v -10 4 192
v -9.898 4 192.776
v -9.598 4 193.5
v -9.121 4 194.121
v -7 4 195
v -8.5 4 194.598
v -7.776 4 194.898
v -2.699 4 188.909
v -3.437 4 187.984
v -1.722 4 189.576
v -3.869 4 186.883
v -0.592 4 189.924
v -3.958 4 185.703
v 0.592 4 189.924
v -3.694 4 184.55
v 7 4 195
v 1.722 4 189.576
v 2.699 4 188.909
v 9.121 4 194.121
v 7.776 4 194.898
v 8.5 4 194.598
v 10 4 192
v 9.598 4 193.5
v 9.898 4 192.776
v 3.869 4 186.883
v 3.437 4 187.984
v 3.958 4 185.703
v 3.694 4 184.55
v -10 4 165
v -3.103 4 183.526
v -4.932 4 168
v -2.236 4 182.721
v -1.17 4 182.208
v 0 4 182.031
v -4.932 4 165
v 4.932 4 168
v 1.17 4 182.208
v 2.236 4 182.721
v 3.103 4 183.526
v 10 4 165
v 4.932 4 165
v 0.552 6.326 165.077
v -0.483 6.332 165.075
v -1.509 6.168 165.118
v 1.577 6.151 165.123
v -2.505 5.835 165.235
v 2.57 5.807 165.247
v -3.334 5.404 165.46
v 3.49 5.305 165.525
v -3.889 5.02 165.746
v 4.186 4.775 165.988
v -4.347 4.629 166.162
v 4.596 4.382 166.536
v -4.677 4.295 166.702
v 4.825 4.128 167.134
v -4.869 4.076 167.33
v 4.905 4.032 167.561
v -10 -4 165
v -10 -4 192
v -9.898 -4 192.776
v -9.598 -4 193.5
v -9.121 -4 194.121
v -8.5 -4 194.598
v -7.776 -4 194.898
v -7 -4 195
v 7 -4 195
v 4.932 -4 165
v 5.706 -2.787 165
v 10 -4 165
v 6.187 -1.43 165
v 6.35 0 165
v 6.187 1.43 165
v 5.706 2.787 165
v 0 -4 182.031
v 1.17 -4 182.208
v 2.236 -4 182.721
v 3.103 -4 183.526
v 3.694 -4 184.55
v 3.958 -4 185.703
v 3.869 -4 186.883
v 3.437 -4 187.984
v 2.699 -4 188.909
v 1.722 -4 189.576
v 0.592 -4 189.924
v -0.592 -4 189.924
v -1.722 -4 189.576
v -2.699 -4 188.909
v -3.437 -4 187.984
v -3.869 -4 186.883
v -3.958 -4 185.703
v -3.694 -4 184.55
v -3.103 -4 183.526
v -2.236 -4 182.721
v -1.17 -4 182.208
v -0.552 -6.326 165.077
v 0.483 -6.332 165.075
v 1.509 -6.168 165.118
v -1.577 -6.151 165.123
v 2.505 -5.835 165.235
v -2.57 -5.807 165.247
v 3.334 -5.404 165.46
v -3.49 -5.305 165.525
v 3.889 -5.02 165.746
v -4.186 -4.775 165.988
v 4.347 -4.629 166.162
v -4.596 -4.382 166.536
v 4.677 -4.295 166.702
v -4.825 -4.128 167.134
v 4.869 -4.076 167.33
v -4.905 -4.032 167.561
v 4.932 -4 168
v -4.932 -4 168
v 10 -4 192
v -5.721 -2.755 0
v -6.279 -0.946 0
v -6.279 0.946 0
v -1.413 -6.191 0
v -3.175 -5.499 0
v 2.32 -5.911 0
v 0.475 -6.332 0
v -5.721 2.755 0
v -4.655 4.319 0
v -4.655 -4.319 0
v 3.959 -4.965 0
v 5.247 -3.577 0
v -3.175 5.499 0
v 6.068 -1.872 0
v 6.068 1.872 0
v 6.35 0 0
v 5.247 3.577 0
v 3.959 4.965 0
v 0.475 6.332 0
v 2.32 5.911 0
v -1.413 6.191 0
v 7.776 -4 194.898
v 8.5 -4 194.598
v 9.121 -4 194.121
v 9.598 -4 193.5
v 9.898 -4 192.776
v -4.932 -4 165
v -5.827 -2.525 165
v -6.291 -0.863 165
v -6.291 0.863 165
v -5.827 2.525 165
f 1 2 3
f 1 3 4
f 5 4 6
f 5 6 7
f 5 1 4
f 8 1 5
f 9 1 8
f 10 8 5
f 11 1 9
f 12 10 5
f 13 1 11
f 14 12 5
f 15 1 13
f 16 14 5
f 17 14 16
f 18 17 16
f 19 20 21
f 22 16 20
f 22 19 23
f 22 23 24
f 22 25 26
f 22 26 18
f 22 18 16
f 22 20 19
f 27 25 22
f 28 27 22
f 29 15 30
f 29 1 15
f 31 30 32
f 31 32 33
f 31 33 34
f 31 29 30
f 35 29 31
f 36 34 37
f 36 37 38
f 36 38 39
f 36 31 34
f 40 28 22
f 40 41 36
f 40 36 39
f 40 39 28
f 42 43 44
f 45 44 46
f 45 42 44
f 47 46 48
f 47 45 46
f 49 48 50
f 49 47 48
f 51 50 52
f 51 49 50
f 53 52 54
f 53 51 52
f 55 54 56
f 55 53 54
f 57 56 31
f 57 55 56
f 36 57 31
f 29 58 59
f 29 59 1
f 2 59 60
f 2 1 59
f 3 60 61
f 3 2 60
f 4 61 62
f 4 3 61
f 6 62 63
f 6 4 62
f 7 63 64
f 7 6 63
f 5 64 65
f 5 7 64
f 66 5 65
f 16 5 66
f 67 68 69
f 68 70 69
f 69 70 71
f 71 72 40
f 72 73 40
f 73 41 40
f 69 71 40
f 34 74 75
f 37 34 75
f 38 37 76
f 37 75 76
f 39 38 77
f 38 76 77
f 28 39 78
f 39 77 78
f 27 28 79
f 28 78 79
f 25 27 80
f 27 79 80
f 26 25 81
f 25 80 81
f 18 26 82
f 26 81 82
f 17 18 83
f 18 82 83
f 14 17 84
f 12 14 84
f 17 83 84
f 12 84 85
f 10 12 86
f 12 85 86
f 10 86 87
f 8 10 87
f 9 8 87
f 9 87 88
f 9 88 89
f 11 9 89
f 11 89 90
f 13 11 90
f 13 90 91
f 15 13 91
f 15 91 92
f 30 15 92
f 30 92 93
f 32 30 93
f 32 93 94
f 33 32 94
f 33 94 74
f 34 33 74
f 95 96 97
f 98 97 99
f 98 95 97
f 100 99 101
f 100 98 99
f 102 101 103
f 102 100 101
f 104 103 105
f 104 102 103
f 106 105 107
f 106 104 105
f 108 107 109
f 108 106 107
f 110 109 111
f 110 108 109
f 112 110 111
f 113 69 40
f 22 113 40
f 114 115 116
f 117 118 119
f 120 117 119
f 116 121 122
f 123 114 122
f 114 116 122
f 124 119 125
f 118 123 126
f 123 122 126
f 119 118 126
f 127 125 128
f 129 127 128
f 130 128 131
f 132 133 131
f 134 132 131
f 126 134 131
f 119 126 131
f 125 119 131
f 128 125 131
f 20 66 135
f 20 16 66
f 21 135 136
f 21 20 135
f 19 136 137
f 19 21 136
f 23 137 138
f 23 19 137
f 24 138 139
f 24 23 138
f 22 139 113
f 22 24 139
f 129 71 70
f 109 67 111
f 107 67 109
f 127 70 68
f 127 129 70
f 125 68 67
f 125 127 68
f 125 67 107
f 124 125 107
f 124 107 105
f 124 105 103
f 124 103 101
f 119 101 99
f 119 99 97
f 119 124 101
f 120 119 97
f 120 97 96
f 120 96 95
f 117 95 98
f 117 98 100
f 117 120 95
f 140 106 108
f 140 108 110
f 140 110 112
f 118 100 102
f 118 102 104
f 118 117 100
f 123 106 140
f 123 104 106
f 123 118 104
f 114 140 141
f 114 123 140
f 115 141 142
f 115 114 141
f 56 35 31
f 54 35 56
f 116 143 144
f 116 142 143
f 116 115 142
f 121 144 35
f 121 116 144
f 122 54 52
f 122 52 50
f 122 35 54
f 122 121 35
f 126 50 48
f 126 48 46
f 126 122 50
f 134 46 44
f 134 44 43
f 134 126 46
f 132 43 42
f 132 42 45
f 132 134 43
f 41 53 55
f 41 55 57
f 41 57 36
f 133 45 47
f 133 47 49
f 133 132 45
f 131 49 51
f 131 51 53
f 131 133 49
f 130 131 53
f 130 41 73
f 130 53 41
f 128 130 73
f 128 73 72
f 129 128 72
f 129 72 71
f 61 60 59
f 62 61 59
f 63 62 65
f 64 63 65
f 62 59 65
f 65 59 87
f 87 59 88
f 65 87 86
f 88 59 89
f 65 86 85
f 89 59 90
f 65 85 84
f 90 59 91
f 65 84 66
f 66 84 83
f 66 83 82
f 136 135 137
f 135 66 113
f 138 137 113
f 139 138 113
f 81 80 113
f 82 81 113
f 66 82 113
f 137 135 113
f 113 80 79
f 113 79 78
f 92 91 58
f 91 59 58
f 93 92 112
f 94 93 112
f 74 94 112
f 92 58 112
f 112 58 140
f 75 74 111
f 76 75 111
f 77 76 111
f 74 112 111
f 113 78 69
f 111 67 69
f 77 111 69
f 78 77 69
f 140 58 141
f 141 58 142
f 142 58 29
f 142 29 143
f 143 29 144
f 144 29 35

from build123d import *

# Parameters (mm, degrees)
CROQUIS1_R              = 6.35
SALIENTE_EXTRUIR1_DEPTH = 165
CROQUIS2_W              = 20
CROQUIS2_H              = 8
SALIENTE_EXTRUIR2_DEPTH = 30
REDONDEO1_R             = 3
REDONDEO2_R             = 3
CROQUIS3_R              = 3.96875
CORTAR_EXTRUIR1_DEPTH   = 30
REDONDEO3_R             = 3


with BuildPart() as part:
    # Croquis1 → Saliente-Extruir1 (new body)
    with BuildSketch(Plane.XY):
        Circle(CROQUIS1_R)
    extrude(amount=SALIENTE_EXTRUIR1_DEPTH)

    # Croquis2 → Saliente-Extruir2 (add)
    with BuildSketch(Plane.XY.offset(165)):
        Rectangle(CROQUIS2_W, CROQUIS2_H)
    extrude(amount=SALIENTE_EXTRUIR2_DEPTH)

    # Redondeo1
    # the kernel refuses this fillet: 3 mm, written as the material it adds along each edge
    with BuildSketch(Plane(origin=(12.431784667, 4, 165), x_dir=(0, 1, 0), z_dir=(-1, 0, 0))) as redondeo1_piece_1_section:
        with BuildLine():
            CenterArc((REDONDEO1_R, -REDONDEO1_R), REDONDEO1_R, 90, 90)
            Line((0, -REDONDEO1_R), (0, 0))
            Line((0, 0), (REDONDEO1_R, 0))
        make_face()
    redondeo1_piece_1 = extrude(amount=24.863569334, mode=Mode.PRIVATE)
    redondeo1_piece_1 = redondeo1_piece_1 & Plane(origin=(0, 0, 165.727834691), x_dir=(1, 0, 0), z_dir=(0, 0, -1)) * Cylinder(6.35, 62, mode=Mode.PRIVATE)
    add(redondeo1_piece_1)

    # Redondeo2
    # the kernel refuses this fillet: 3 mm, written as the material it adds along each edge
    with BuildSketch(Plane(origin=(-12.431784667, -4, 165), x_dir=(0, 0, 1), z_dir=(1, 0, 0))) as redondeo2_piece_1_section:
        with BuildLine():
            CenterArc((REDONDEO2_R, REDONDEO2_R), REDONDEO2_R, 180, 90)
            Line((0, REDONDEO2_R), (0, 0))
            Line((0, 0), (REDONDEO2_R, 0))
        make_face()
    redondeo2_piece_1 = extrude(amount=24.863569334, mode=Mode.PRIVATE)
    redondeo2_piece_1 = redondeo2_piece_1 & Plane(origin=(0, 0, 165.727832958), x_dir=(1, 0, 0), z_dir=(0, 0, -1)) * Cylinder(6.35, 62, mode=Mode.PRIVATE)
    add(redondeo2_piece_1)

    # Croquis3 → Cortar-Extruir1 (cut)
    with BuildSketch(Plane.XZ.offset(4)):
        with Locations(Location((0, 186, 0), (0, 0, 270))):
            Circle(CROQUIS3_R)
    extrude(amount=-CORTAR_EXTRUIR1_DEPTH, mode=Mode.SUBTRACT)

    # Redondeo3
    redondeo3_edges = [part.edges().sort_by_distance(p)[0] for p in [
        (10, 0, 195),
        (-10, 0, 195),
    ]]
    fillet(redondeo3_edges, radius=REDONDEO3_R)


solid = part.part
